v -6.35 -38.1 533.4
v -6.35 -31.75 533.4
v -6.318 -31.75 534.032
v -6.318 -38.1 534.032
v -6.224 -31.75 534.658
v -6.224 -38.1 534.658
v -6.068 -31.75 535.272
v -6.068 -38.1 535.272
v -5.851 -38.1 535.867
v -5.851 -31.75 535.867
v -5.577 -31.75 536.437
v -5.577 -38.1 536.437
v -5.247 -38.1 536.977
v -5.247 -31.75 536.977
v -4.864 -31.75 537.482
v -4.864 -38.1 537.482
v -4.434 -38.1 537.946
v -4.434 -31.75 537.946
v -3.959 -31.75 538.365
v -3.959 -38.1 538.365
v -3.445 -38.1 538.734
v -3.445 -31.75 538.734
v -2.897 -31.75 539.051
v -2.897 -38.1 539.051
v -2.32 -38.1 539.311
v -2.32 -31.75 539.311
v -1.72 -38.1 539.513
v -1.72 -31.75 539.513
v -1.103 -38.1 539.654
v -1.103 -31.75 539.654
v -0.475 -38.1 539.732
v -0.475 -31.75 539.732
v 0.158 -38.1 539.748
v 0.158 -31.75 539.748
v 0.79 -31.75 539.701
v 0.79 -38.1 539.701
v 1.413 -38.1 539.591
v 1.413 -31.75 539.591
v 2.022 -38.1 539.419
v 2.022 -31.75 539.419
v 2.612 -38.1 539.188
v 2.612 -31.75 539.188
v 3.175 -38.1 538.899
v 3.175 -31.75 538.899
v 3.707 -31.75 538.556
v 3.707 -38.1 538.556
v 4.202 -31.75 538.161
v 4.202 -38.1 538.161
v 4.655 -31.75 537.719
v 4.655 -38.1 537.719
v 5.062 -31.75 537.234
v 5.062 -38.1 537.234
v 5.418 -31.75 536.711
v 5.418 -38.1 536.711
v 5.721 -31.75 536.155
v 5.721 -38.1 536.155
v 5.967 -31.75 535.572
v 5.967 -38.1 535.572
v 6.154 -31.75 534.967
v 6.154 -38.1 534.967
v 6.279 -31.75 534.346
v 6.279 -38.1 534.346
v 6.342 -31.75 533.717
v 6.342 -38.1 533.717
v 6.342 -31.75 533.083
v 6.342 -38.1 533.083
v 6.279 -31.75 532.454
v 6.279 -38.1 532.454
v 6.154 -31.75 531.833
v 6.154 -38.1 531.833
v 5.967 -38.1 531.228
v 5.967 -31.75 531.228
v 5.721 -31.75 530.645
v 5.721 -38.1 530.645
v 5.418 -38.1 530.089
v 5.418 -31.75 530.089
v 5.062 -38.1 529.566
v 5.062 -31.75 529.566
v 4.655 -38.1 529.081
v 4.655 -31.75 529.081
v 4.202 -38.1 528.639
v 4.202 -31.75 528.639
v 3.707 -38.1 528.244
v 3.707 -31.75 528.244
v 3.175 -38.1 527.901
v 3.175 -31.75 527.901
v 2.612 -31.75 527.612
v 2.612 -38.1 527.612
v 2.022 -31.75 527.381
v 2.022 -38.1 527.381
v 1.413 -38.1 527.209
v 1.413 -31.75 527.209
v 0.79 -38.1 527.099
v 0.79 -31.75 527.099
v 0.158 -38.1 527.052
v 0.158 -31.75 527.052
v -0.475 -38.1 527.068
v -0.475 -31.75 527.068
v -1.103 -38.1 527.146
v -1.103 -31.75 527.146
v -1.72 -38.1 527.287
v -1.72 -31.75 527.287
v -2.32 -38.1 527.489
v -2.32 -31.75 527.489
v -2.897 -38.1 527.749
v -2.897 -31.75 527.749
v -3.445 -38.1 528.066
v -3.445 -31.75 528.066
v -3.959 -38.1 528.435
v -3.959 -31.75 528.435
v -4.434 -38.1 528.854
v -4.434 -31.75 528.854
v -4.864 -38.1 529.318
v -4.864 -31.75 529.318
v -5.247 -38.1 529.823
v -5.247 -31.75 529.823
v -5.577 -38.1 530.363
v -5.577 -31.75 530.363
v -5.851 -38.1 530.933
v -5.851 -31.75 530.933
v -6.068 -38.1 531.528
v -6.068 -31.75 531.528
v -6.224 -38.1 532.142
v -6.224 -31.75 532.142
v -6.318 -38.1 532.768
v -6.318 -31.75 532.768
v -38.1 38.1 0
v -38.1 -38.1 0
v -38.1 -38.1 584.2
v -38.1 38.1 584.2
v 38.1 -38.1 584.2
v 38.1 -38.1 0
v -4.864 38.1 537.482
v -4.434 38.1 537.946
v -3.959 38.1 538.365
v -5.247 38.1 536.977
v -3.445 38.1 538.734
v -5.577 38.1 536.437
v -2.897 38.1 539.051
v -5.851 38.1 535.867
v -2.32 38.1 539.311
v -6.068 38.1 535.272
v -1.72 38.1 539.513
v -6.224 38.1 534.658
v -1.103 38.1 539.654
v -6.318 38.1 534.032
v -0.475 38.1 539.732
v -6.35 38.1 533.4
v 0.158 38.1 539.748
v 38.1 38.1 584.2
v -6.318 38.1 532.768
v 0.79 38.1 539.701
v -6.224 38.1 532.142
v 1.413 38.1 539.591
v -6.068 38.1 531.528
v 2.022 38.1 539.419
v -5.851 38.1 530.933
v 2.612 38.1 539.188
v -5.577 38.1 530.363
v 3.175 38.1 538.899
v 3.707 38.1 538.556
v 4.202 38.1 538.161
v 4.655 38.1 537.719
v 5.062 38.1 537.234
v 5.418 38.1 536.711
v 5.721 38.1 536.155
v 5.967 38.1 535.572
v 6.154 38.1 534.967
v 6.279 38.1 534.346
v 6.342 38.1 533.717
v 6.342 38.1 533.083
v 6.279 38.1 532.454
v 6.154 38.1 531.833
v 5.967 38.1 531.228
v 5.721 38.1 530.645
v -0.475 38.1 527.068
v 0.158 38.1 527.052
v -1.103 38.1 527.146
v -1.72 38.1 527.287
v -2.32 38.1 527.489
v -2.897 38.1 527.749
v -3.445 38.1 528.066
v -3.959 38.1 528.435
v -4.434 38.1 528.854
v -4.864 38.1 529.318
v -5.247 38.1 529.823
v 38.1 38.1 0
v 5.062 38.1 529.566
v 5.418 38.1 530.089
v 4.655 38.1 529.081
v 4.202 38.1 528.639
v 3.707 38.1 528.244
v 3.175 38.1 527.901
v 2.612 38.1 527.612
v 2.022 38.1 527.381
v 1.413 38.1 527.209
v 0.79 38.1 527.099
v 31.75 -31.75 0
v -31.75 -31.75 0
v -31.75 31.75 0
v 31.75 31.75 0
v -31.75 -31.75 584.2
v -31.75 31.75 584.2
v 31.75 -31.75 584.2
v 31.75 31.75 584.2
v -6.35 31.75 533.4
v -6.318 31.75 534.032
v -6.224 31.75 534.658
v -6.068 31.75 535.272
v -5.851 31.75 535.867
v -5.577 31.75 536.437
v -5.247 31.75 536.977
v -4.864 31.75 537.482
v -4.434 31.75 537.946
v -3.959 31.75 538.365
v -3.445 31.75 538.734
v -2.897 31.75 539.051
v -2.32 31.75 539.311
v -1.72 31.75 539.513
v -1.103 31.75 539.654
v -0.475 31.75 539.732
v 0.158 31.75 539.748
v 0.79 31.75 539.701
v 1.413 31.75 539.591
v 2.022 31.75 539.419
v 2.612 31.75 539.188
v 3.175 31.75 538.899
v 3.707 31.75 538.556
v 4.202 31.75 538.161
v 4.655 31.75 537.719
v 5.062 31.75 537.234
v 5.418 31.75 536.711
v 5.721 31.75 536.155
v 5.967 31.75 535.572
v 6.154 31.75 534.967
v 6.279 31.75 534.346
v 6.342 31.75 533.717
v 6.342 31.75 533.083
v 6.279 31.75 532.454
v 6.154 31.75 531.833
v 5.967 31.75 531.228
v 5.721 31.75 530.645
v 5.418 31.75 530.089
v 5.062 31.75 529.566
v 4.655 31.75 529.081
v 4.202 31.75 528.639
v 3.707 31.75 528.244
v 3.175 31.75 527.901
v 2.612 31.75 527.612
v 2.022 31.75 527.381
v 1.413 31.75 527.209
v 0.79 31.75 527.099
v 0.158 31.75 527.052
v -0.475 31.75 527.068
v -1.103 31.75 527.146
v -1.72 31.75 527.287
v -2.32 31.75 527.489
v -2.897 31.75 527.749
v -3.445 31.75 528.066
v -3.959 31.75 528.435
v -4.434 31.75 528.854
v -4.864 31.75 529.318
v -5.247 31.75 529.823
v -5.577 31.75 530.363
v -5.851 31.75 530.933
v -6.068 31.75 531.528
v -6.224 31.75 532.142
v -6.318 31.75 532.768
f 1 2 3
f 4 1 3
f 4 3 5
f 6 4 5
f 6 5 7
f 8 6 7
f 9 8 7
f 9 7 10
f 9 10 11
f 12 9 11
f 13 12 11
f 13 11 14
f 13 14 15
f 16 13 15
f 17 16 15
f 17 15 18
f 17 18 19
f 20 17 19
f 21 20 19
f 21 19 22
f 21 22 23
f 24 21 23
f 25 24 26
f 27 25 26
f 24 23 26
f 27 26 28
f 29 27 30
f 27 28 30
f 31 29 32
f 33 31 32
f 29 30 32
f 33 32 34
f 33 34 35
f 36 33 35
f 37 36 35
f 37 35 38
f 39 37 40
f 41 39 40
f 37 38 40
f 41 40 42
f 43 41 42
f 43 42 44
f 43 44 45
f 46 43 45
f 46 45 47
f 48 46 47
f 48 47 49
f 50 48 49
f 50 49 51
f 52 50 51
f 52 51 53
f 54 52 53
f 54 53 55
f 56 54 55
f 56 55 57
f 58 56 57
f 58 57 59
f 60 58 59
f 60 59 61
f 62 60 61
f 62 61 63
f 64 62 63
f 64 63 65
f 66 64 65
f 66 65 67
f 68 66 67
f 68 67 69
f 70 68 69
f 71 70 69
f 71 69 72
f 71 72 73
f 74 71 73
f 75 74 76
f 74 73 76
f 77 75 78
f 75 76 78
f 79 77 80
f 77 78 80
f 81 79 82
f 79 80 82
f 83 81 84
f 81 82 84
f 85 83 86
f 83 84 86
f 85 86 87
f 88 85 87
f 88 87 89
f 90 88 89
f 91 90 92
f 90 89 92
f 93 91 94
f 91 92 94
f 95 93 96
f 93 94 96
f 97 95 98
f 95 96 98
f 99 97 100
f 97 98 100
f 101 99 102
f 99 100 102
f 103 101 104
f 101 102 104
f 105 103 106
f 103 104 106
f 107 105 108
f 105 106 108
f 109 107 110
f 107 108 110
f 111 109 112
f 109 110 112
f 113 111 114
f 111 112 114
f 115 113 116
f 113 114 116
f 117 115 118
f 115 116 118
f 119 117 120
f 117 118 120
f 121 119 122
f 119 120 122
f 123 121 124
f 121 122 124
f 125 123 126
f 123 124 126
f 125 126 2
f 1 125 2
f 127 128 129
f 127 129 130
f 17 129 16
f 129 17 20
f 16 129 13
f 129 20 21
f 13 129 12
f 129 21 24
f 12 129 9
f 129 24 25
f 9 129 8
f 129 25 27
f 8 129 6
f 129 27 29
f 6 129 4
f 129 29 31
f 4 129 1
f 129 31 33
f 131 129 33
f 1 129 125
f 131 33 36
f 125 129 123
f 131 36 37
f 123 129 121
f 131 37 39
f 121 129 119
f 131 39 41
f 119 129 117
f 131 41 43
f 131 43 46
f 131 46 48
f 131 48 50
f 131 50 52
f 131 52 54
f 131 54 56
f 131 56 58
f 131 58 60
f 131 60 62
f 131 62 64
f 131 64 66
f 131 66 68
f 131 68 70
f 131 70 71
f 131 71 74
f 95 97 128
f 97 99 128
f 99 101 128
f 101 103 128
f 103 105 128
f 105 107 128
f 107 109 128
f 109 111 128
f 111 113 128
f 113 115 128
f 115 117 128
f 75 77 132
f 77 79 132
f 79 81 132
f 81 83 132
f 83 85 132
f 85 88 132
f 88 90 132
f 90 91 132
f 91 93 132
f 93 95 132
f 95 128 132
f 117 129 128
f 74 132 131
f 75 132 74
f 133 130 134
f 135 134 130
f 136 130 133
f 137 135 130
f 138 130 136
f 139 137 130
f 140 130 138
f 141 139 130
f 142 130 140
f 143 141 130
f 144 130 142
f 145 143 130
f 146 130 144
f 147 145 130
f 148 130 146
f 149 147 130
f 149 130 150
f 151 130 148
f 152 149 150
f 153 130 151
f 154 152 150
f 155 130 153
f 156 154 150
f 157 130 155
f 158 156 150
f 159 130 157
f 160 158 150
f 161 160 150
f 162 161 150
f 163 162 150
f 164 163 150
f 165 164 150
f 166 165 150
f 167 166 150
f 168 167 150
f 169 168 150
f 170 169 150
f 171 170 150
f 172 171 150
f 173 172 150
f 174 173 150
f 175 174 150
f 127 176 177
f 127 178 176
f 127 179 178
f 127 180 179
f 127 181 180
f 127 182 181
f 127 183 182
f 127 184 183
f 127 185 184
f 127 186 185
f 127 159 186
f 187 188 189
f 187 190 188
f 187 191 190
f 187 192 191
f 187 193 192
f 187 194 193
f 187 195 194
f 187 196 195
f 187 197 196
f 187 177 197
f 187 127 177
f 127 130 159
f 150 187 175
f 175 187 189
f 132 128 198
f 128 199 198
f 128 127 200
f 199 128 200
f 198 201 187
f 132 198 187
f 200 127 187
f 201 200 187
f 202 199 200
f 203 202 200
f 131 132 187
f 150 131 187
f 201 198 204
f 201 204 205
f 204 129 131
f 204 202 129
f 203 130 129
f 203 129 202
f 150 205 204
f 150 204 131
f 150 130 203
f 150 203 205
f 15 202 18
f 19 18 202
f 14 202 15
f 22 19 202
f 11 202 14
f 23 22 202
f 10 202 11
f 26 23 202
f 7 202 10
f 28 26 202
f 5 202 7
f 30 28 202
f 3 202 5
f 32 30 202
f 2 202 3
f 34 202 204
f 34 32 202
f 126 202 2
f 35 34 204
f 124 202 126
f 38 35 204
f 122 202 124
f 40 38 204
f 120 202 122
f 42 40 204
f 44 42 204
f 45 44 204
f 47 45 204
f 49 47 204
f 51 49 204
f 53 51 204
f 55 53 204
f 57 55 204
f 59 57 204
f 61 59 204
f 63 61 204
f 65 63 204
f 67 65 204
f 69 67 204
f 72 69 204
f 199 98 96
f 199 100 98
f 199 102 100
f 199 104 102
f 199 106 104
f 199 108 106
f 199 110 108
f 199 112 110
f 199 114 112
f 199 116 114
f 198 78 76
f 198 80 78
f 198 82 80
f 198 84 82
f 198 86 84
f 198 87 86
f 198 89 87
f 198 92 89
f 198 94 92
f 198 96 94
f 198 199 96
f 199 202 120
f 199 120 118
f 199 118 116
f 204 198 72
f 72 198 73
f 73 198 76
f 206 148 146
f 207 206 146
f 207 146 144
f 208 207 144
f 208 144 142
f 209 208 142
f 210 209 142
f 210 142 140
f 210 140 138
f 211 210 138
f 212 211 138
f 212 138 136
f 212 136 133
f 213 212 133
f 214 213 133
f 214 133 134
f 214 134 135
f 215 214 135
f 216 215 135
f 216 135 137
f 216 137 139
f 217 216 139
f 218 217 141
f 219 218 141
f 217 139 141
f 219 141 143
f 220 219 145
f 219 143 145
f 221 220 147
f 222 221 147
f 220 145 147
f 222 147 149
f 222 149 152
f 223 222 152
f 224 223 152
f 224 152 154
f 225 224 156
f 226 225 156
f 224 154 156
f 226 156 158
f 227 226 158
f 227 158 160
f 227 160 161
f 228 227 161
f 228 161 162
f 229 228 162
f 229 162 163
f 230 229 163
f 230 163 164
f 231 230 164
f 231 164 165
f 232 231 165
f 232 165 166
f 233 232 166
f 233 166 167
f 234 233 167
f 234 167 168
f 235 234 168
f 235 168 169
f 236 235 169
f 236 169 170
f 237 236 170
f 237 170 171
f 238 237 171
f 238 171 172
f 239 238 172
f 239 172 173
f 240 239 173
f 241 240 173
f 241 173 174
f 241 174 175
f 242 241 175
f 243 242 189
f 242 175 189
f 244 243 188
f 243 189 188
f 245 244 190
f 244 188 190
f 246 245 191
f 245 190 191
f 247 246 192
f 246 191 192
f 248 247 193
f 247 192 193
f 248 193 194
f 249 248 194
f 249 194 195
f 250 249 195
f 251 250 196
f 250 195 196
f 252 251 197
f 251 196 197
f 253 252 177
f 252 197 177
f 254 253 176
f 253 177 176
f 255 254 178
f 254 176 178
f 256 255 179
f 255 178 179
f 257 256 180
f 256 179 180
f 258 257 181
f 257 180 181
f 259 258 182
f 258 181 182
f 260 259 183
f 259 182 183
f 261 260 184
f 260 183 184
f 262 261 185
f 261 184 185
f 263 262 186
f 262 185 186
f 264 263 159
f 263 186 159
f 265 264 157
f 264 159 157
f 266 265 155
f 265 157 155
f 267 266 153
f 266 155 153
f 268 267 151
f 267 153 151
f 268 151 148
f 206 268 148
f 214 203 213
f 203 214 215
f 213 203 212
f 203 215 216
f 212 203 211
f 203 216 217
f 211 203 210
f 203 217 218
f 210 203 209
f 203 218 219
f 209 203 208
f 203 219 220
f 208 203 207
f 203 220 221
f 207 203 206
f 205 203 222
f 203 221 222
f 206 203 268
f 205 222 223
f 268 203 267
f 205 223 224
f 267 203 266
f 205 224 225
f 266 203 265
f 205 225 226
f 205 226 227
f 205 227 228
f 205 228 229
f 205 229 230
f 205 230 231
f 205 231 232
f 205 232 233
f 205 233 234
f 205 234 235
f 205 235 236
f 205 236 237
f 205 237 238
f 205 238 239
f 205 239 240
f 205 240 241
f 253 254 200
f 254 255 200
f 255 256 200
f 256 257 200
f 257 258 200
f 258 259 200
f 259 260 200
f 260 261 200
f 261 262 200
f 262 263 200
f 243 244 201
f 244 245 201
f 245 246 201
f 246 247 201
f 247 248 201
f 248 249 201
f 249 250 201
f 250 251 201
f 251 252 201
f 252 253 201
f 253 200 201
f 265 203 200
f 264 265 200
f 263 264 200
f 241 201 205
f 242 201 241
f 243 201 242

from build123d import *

# Parameters (mm, degrees)
F0_W     = 76.2
F0_H     = 76.2
F0_W_2   = 63.5
F0_H_2   = 63.5
F1_DEPTH = 584.2
F3_D     = 12.7


# Not quite as in the source:
# - a length typed as a fraction of an inch, garbled in the dataset ("3 / 203.2 mm" for 3/8 in), is restored


with BuildPart() as f1:
    # F0 (on Top) → F1 (new body)
    with BuildSketch(Plane.XY):
        Rectangle(F0_W, F0_H)
        Rectangle(F0_W_2, F0_H_2, mode=Mode.SUBTRACT)
    extrude(amount=F1_DEPTH)

    # F3 (through all)
    with Locations(Plane.XZ.offset(38.1)):
        with Locations((0, 533.4)):
            Hole(F3_D / 2)


solid = f1.part
